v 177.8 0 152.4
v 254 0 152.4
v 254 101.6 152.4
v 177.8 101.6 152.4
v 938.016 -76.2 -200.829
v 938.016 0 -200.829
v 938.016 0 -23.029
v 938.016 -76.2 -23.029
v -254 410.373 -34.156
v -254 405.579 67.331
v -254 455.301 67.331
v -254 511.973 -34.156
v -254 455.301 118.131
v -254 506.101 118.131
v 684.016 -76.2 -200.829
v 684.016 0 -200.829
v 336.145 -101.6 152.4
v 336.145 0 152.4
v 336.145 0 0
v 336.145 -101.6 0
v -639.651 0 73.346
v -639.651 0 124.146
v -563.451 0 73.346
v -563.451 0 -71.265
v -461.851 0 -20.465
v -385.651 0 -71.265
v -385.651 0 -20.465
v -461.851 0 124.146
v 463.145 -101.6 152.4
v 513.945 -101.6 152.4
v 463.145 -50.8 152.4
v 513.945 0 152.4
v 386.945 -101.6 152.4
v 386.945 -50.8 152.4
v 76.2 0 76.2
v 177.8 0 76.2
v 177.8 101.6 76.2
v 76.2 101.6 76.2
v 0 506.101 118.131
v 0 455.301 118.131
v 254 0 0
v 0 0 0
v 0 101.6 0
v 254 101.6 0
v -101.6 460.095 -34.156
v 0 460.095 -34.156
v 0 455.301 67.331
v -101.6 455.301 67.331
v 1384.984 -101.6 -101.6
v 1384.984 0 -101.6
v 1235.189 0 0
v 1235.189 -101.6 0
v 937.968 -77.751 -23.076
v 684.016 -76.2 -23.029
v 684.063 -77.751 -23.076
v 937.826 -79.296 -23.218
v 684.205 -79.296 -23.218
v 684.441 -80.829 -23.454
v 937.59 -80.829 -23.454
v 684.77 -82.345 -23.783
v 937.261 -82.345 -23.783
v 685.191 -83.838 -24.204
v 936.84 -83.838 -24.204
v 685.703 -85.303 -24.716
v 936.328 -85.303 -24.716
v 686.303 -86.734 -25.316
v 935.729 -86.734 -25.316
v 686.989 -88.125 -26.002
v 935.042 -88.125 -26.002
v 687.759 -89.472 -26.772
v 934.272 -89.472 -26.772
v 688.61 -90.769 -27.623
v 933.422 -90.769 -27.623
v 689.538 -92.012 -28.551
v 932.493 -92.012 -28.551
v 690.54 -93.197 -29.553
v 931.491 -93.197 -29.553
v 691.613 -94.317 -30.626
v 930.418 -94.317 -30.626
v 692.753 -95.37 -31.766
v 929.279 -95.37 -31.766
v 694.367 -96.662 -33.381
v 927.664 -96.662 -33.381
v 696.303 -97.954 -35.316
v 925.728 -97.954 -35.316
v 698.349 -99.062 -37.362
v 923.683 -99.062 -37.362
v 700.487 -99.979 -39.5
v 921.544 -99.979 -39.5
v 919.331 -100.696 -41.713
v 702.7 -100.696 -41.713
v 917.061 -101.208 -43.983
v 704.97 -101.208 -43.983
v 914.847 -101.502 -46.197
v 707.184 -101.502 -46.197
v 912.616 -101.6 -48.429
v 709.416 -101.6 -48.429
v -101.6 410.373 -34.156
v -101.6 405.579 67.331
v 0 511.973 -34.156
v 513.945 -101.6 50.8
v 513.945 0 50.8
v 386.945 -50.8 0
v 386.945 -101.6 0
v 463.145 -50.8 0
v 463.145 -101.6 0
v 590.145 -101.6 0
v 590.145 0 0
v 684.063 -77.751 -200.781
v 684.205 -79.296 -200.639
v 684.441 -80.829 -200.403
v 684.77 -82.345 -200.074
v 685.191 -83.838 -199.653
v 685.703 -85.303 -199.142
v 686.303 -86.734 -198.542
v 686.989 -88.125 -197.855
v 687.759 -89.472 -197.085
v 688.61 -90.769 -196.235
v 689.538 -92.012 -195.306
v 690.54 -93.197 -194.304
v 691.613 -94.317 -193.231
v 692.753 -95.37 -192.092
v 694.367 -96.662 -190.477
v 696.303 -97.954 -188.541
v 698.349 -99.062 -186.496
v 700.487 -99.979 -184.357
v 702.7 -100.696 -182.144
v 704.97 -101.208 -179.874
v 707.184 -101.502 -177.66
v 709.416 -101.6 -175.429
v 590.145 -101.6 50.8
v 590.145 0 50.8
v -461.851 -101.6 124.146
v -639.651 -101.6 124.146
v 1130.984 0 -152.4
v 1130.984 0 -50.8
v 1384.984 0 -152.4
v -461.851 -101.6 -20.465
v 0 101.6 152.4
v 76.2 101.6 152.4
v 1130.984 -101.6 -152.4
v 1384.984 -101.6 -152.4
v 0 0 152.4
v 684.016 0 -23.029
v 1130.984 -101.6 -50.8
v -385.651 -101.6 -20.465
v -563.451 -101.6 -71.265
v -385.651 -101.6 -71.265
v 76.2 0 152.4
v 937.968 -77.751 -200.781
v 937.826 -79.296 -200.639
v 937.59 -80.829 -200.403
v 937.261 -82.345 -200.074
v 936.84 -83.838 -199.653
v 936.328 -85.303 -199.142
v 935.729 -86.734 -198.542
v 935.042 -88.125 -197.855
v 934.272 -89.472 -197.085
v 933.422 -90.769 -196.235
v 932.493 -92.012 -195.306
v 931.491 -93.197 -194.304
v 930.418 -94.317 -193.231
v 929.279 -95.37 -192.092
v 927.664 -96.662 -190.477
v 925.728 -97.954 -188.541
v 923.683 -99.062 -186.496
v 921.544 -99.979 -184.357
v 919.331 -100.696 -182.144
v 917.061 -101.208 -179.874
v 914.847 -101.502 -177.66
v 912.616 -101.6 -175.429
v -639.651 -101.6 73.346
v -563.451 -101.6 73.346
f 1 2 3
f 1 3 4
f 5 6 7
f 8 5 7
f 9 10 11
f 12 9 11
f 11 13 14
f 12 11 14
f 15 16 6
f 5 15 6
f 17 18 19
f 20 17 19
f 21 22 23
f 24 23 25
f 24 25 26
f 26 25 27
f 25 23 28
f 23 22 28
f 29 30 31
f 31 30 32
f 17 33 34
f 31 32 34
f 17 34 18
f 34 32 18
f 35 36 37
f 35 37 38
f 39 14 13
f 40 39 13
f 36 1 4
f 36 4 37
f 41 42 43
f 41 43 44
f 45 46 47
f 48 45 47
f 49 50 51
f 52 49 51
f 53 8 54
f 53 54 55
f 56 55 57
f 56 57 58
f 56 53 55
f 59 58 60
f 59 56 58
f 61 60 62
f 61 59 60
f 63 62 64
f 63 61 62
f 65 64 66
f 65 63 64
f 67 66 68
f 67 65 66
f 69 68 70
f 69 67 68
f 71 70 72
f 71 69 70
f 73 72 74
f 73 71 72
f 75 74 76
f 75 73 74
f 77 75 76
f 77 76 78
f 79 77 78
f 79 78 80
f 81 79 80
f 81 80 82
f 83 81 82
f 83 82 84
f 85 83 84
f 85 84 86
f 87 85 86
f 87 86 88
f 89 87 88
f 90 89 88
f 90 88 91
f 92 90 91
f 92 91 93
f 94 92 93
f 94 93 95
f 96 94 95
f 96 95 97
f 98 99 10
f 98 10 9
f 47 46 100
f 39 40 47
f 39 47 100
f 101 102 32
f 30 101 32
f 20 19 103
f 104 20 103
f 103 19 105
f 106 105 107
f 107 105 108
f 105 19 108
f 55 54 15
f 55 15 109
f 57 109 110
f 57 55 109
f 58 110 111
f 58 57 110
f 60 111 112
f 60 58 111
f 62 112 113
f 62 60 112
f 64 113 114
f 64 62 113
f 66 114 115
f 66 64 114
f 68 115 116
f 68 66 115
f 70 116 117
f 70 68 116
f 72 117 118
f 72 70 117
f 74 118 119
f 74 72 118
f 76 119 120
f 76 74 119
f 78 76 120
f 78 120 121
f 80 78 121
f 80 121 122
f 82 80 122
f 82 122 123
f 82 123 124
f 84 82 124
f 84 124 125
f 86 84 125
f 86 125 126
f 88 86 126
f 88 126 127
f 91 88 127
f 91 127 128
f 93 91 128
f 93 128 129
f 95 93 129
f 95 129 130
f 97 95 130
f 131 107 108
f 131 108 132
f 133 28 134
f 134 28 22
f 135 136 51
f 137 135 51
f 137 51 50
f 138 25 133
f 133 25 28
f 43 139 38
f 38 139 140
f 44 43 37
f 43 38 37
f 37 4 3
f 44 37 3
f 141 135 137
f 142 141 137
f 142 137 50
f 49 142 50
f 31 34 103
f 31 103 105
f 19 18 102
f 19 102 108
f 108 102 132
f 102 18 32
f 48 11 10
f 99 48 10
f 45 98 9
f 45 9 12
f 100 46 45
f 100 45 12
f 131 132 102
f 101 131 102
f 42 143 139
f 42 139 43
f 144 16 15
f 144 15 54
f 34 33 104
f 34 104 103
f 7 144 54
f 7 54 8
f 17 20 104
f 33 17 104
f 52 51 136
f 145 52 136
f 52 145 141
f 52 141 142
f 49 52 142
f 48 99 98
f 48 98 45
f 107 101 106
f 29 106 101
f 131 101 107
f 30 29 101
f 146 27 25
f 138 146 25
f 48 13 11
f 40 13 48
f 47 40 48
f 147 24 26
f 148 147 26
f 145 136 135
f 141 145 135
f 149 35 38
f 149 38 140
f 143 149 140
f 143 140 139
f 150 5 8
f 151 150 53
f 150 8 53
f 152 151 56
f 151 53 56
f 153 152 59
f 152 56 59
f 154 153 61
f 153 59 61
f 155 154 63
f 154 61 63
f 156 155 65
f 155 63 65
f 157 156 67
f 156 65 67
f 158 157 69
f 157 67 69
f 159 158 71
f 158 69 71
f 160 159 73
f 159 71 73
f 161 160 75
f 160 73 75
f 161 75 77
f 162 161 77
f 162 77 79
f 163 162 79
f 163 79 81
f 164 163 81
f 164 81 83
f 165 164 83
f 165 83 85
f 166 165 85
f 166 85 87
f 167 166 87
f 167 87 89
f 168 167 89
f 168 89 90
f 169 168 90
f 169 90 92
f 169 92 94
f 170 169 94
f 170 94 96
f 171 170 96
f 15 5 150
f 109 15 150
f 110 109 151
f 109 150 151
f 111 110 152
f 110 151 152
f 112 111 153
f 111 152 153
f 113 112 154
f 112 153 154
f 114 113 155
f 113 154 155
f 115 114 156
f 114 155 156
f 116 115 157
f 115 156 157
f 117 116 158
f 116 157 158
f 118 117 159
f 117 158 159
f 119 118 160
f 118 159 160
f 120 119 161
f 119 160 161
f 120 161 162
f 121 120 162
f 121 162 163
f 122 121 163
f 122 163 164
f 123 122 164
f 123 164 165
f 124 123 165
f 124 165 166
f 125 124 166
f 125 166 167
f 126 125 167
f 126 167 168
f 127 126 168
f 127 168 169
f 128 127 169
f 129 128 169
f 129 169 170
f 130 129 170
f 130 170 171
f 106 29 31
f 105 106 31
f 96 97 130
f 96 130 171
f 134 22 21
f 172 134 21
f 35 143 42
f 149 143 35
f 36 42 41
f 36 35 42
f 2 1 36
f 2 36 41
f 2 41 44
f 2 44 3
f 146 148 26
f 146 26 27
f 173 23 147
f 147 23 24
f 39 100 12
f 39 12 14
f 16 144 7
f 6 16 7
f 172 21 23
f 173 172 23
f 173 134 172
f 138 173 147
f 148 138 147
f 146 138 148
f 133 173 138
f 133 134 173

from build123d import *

# Parameters (mm, degrees)
F1_DEPTH  = 101.6
F3_DEPTH  = 254
F5_DEPTH  = 101.6
F7_DEPTH  = 101.6
F8_W      = 76.2
F8_H      = 50.8
F9_DEPTH  = 152.4
F11_DEPTH = 101.6
F13_DEPTH = 101.6
F14_W     = 254
F14_H     = 177.8
F15_DEPTH = 101.6
F16_R     = 25.4


with BuildPart() as f1:
    # F0 (on Front) → F1 (new body)
    with BuildSketch(Plane.XZ):
        Polygon((0, 152.4), (0, 0), (254, 0), (254, 152.4), (177.8, 152.4), (177.8, 76.2), (76.2, 76.2), (76.2, 152.4), align=None)
    extrude(amount=-F1_DEPTH)


with BuildPart() as f3:
    # F2 (on Right) → F3 (new body)
    with BuildSketch(Plane.YZ):
        Polygon((405.579255, 67.330746), (410.3731, -34.156095), (511.9731, -34.156095), (506.101318, 118.130746), (455.301318, 118.130746), (455.301318, 67.330746), align=None)
    extrude(amount=-F3_DEPTH)

    # F4 (on face) → F5 (cut)
    with BuildSketch(Plane.YZ):
        Polygon((460.095163, -34.156095), (455.301318, 67.330746), (405.579255, 67.330746), (410.3731, -34.156095), align=None)
    extrude(amount=-F5_DEPTH, mode=Mode.SUBTRACT)


with BuildPart() as f7:
    # F6 (on Front) → F7 (new body)
    with BuildSketch(Plane.XZ):
        Polygon((336.144794, 152.4), (336.144794, 0), (590.144794, 0), (590.144794, 50.8), (513.944794, 50.8), (513.944794, 152.4), align=None)
    extrude(amount=F7_DEPTH)

    # F8 (on face) → F9 (cut)
    with BuildSketch(Plane.XY.offset(152.4)):
        with Locations((425.044794, -76.2)):
            Rectangle(F8_W, F8_H)
    extrude(amount=-F9_DEPTH, mode=Mode.SUBTRACT)


with BuildPart() as f11:
    # F10 (on Front) → F11 (new body)
    with BuildSketch(Plane.XZ):
        Polygon((-461.851425, 124.14594), (-639.651425, 124.14594), (-639.651425, 73.34594), (-563.451425, 73.34594), (-563.451425, -71.264796), (-385.651425, -71.264796), (-385.651425, -20.464796), (-461.851425, -20.464796), align=None)
    extrude(amount=F11_DEPTH)


with BuildPart() as f13:
    # F12 (on Front) → F13 (new body)
    with BuildSketch(Plane.XZ):
        Polygon((1130.984204, -50.8), (1130.984204, -152.4), (1235.189269, -152.4), (1235.189269, 0), align=None)
        Polygon((1235.189269, 0), (1235.189269, -152.4), (1384.984204, -152.4), (1384.984204, -101.6), align=None)
    extrude(amount=F13_DEPTH)


with BuildPart() as f15:
    # F14 (on Front) → F15 (new body)
    with BuildSketch(Plane.XZ):
        with Locations((811.015688, -111.928712)):
            Rectangle(F14_W, F14_H)
    extrude(amount=F15_DEPTH)

    # F16
    f16_edges = [f15.edges().sort_by_distance(p)[0] for p in [
        (811.015688, -101.6, -23.028712),
        (684.015688, -101.6, -111.928712),
        (811.015688, -101.6, -200.828712),
        (938.015688, -101.6, -111.928712),
    ]]
    fillet(f16_edges, radius=F16_R)


solid = Compound([f1.part, f3.part, f7.part, f11.part, f13.part, f15.part])
